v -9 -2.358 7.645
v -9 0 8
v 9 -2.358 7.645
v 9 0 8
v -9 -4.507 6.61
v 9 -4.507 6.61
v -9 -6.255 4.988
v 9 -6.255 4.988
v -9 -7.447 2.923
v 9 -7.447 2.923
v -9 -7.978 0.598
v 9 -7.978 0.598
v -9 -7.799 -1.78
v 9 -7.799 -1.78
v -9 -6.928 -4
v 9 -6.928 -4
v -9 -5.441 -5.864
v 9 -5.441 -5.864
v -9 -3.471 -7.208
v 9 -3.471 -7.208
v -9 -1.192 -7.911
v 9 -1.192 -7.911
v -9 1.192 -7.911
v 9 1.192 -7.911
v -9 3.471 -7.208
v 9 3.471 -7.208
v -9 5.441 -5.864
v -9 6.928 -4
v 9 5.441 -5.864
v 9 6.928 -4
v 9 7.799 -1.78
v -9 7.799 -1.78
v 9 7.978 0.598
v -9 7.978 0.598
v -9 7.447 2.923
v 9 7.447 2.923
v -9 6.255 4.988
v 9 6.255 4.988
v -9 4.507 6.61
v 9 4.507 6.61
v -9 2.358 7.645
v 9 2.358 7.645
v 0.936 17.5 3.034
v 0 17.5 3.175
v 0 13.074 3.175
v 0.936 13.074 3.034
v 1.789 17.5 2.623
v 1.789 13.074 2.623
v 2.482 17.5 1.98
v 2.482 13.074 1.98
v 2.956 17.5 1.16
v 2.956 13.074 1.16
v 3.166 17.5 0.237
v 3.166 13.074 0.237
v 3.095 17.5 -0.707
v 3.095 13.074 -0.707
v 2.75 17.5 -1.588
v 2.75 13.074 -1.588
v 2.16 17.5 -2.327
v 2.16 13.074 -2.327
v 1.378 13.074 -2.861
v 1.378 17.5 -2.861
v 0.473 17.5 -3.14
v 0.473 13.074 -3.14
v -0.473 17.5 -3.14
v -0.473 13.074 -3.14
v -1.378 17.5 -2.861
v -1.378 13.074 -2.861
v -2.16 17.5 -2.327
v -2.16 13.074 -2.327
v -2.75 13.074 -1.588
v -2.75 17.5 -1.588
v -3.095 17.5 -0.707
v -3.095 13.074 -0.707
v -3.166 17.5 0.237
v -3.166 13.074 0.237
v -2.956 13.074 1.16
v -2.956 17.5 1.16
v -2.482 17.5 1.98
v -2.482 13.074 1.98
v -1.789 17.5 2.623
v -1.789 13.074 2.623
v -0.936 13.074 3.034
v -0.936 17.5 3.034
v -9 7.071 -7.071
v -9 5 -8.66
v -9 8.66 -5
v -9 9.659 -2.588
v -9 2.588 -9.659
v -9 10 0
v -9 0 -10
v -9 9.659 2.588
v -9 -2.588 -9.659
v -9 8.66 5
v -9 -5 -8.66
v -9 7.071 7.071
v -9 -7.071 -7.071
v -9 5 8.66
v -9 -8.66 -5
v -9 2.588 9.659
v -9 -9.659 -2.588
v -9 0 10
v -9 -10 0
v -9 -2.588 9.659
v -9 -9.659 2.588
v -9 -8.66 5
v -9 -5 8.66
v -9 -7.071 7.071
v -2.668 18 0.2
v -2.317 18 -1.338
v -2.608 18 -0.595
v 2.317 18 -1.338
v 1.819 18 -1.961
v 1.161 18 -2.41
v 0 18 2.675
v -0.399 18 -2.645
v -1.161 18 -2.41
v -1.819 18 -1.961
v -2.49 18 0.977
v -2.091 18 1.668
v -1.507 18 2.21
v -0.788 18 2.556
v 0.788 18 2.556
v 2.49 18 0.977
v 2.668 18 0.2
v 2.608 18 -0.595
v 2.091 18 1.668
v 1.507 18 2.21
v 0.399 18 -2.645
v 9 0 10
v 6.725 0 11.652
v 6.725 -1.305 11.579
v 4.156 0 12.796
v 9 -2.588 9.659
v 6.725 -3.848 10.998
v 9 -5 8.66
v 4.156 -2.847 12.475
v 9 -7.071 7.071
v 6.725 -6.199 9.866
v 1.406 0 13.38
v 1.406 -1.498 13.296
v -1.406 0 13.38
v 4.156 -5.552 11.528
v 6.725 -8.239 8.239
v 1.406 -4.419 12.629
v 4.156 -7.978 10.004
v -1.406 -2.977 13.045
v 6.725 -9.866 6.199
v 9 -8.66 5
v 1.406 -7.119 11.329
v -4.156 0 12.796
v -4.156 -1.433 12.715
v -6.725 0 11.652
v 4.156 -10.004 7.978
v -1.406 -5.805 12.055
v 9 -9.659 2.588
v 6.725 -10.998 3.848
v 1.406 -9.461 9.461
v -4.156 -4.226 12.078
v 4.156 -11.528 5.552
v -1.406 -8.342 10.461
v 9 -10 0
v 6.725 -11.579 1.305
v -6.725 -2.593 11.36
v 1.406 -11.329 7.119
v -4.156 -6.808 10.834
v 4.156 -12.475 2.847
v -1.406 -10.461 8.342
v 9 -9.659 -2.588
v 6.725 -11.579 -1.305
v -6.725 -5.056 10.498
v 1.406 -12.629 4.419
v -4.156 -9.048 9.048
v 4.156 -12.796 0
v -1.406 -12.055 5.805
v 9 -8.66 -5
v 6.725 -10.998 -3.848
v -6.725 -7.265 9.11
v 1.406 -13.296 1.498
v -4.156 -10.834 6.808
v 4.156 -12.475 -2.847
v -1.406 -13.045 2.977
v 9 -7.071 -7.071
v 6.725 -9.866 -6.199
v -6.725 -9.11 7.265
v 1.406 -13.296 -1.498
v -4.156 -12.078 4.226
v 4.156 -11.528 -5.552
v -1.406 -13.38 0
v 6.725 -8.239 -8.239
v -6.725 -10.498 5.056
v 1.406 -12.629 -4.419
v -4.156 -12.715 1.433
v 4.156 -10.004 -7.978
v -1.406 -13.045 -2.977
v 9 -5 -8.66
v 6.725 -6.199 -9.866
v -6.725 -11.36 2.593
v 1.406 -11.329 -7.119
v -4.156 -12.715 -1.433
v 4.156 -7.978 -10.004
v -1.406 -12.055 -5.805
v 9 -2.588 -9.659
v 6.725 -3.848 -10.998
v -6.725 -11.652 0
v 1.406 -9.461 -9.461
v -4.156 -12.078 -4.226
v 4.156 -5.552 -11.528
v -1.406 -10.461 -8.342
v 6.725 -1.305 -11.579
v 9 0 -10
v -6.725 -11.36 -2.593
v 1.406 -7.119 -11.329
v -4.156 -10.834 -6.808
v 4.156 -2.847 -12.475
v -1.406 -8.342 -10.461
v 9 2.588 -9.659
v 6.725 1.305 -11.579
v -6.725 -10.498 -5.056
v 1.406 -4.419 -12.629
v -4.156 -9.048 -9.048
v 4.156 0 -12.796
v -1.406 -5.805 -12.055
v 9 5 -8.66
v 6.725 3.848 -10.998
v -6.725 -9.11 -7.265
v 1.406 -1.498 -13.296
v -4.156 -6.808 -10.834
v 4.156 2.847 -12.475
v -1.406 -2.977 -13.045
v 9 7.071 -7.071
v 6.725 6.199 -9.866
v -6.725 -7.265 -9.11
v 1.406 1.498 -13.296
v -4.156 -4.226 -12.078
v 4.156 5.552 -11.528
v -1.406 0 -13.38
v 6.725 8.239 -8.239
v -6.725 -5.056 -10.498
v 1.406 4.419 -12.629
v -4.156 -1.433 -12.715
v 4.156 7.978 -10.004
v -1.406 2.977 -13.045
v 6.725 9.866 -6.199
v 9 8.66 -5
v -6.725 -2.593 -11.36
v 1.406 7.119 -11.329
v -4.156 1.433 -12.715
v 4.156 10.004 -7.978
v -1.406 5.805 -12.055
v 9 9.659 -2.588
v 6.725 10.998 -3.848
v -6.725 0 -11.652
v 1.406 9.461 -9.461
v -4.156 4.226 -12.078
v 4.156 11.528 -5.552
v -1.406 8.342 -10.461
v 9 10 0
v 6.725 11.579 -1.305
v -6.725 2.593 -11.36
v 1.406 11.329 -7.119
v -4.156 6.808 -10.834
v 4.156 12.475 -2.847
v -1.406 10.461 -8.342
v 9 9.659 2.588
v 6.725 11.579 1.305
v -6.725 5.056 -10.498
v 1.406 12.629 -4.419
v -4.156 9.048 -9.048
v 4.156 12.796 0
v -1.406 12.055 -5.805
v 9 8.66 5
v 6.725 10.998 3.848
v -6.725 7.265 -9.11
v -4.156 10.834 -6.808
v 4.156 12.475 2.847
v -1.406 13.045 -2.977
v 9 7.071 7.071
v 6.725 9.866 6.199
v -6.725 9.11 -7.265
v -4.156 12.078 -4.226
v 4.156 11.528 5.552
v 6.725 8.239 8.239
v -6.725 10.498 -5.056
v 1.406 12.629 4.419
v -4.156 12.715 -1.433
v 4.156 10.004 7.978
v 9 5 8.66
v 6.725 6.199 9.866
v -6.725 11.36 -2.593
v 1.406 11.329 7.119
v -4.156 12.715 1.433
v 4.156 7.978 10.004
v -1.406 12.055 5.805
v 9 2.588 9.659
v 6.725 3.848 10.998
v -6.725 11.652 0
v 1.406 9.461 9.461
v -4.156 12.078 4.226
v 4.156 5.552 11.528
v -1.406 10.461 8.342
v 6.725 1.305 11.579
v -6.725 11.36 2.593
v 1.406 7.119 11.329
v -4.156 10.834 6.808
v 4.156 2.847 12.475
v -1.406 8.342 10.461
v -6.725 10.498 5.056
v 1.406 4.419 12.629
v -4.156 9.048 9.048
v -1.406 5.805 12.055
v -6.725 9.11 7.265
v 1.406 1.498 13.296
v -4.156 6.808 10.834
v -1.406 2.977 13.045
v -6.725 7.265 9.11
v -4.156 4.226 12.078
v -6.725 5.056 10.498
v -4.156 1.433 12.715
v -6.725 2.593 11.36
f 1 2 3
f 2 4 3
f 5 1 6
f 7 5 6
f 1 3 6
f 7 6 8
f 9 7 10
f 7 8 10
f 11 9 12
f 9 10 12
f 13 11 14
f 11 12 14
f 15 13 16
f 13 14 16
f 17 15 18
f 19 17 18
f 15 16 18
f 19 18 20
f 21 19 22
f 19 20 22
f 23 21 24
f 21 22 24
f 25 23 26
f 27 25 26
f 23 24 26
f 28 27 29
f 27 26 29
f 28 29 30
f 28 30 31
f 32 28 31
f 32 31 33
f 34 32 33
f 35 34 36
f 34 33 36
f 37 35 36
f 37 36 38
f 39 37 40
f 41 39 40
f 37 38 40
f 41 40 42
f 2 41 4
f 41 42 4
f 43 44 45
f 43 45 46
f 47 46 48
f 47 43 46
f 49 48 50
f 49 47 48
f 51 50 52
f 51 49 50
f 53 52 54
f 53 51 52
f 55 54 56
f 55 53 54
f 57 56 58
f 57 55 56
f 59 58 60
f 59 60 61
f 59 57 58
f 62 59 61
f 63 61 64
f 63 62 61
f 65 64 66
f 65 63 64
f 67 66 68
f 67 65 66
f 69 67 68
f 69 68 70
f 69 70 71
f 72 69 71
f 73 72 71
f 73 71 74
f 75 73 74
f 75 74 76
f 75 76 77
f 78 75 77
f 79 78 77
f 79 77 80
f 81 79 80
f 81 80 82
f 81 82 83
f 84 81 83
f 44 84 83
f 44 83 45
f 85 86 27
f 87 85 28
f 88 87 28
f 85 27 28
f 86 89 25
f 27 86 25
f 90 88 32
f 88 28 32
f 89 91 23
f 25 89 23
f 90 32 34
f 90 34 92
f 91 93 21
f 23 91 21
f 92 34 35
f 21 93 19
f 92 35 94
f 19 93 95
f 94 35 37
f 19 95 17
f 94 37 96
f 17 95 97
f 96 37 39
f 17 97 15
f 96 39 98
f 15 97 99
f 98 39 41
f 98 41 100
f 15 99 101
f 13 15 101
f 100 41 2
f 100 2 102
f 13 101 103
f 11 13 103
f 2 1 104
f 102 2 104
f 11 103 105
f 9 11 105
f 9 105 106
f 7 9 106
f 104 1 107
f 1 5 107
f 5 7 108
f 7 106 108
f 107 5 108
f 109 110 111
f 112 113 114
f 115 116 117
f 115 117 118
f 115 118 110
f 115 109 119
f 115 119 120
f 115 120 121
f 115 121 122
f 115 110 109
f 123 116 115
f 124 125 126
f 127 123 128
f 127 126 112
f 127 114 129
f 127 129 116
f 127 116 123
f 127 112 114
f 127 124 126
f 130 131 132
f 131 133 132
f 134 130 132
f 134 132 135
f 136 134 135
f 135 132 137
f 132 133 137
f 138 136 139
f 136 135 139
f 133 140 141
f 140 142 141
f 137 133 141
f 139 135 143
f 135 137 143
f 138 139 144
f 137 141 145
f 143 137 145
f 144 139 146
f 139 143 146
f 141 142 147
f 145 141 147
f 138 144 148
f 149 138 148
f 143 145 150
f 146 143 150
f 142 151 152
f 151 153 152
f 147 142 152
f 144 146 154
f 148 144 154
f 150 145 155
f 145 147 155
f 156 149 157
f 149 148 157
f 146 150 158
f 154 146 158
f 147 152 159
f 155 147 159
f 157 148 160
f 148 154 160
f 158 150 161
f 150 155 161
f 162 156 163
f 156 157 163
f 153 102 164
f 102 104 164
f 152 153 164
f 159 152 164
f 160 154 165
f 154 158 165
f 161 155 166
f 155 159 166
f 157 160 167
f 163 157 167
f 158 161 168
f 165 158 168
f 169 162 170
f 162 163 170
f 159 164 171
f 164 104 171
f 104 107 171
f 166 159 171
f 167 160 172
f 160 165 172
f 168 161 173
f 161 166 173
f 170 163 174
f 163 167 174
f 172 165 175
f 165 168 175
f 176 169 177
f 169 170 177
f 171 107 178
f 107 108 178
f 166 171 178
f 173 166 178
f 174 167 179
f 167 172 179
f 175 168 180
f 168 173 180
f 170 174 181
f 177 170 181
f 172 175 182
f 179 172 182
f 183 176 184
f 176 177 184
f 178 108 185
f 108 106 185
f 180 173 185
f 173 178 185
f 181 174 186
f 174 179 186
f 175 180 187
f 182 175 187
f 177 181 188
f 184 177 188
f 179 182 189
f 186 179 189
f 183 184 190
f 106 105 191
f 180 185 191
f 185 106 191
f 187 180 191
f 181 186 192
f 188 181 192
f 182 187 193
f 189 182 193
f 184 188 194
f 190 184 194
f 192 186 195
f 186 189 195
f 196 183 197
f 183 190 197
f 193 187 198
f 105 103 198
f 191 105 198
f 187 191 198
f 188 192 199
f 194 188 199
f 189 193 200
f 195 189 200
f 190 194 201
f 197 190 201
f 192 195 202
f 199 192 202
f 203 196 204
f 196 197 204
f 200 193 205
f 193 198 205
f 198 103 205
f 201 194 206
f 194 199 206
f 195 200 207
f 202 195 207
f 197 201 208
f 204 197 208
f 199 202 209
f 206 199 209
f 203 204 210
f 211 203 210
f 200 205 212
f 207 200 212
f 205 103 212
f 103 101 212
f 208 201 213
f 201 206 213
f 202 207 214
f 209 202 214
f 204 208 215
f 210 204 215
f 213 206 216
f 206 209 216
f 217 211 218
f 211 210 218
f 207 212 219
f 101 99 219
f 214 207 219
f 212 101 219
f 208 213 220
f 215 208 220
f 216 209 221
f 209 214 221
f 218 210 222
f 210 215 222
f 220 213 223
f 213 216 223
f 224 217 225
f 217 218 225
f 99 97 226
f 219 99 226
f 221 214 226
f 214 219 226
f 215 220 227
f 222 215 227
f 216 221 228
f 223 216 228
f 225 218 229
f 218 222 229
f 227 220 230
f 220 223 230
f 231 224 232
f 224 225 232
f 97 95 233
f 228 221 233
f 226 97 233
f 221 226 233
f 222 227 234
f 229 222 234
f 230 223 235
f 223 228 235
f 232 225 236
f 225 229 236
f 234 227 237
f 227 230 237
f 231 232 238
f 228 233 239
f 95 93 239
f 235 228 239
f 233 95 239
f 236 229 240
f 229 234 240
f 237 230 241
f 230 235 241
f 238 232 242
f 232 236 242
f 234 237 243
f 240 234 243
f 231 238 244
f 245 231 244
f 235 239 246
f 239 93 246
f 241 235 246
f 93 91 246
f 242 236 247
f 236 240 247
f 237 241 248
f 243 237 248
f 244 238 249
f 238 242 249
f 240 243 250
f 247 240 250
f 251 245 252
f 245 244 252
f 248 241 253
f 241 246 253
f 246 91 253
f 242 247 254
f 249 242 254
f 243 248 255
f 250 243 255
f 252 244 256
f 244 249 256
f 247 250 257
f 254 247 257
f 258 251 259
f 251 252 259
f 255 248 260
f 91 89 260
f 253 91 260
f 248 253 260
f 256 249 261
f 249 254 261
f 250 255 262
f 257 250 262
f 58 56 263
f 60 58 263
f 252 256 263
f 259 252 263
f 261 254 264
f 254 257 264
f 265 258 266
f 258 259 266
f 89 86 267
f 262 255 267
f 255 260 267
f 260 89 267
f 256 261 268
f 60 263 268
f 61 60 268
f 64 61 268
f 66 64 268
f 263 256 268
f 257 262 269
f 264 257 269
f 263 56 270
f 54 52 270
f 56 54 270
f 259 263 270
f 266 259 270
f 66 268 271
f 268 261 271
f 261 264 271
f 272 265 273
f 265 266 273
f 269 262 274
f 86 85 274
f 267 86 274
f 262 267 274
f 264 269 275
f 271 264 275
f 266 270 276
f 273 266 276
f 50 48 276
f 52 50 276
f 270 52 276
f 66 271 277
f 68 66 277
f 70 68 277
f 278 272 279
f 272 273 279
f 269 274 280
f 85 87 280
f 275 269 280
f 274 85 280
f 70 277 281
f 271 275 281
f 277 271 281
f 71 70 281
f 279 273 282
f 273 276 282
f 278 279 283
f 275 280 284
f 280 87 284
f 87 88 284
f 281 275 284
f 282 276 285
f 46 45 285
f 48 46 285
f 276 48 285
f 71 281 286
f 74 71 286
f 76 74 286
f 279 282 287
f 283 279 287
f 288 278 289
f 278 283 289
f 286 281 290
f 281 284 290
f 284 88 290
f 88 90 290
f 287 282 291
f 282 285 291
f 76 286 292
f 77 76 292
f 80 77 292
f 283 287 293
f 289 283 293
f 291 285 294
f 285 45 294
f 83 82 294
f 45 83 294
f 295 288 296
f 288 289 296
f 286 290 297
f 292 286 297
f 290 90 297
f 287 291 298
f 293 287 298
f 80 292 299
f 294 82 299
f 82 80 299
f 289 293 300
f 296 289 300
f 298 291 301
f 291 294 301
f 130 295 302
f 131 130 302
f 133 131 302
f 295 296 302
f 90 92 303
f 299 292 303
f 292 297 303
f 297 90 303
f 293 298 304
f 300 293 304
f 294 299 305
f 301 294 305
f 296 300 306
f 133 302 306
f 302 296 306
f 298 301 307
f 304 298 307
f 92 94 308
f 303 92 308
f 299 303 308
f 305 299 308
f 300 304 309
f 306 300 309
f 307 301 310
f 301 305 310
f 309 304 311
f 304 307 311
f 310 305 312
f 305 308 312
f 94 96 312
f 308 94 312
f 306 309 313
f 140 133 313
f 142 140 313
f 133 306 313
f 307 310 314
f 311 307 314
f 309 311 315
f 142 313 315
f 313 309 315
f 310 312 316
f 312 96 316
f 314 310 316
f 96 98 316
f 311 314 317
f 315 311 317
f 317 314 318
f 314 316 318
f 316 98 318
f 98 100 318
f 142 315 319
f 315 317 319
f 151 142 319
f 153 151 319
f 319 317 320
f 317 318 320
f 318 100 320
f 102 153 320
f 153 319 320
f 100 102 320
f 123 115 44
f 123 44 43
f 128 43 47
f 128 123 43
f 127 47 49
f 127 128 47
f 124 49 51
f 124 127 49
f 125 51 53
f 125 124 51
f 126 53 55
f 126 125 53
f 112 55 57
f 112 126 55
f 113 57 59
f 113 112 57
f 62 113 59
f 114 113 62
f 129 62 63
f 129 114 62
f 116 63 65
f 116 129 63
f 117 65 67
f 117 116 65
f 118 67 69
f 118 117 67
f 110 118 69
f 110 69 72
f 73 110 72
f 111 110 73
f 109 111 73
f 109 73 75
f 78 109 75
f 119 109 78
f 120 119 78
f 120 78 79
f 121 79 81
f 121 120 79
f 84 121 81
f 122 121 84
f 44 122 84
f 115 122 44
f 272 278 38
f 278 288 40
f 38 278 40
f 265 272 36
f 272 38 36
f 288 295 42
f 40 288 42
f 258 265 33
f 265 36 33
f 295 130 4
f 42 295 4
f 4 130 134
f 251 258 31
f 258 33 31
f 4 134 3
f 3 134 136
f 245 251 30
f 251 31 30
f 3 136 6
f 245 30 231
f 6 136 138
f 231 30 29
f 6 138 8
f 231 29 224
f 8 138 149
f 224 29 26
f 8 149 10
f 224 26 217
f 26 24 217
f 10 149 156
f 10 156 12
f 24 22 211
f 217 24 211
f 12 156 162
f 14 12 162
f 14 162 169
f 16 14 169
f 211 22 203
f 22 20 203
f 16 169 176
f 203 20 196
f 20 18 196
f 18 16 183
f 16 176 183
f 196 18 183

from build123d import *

# Parameters (mm, degrees)
RESSALTO_EXTRUS_O1_REACH      = 37.374
RESSALTO_EXTRUS_O1_END_RADIUS = 13.453624047
ESBO_O2_R                     = 3.175
CHANFRO1_SIZE                 = 0.5


with BuildPart() as part:
    # Esboço1 → Revolução1 (revolve)
    with BuildSketch(Plane.XY, mode=Mode.PRIVATE) as revolu_o1_sk:
        with BuildLine():
            Line((-9, 10), (-9, 8))
            Line((-9, 8), (9, 8))
            Line((9, 8), (9, 10))
            ThreePointArc((9, 10), (0, 13.453624047), (-9, 10))
        make_face()
    revolve(revolu_o1_sk.sketch.rotate(Axis((0, 0, 0), (1, 0, 0)), 90), axis=Axis((0, 0, 0), (1, 0, 0)))

    # Ressalto-extrusão1: up to this sphere (the profile starts outside it)
    ressalto_extrus_o1_end = Location((0, 0, 0)) * Sphere(RESSALTO_EXTRUS_O1_END_RADIUS, mode=Mode.PRIVATE)
    # Esboço2 → Ressalto-extrusão1 (add, up to the surface)
    with BuildSketch(Plane(origin=(0, 18, 0), x_dir=(1, 0, 0), z_dir=(0, 1, 0)), mode=Mode.PRIVATE) as ressalto_extrus_o1_sk1:
        with Locations(Location((0, 0, 0), (0, 0, 270))):
            Circle(ESBO_O2_R)
    ressalto_extrus_o1_tool1 = extrude(ressalto_extrus_o1_sk1.sketch, amount=-RESSALTO_EXTRUS_O1_REACH, mode=Mode.PRIVATE) - ressalto_extrus_o1_end
    add(ressalto_extrus_o1_tool1.solids().sort_by_distance((0, 18, 0))[0])

    # Chanfro1
    chanfro1_edges = [part.edges().sort_by_distance(p)[0] for p in [
        (0, 18, -3.175),
    ]]
    chamfer(chanfro1_edges, length=CHANFRO1_SIZE)


solid = part.part
